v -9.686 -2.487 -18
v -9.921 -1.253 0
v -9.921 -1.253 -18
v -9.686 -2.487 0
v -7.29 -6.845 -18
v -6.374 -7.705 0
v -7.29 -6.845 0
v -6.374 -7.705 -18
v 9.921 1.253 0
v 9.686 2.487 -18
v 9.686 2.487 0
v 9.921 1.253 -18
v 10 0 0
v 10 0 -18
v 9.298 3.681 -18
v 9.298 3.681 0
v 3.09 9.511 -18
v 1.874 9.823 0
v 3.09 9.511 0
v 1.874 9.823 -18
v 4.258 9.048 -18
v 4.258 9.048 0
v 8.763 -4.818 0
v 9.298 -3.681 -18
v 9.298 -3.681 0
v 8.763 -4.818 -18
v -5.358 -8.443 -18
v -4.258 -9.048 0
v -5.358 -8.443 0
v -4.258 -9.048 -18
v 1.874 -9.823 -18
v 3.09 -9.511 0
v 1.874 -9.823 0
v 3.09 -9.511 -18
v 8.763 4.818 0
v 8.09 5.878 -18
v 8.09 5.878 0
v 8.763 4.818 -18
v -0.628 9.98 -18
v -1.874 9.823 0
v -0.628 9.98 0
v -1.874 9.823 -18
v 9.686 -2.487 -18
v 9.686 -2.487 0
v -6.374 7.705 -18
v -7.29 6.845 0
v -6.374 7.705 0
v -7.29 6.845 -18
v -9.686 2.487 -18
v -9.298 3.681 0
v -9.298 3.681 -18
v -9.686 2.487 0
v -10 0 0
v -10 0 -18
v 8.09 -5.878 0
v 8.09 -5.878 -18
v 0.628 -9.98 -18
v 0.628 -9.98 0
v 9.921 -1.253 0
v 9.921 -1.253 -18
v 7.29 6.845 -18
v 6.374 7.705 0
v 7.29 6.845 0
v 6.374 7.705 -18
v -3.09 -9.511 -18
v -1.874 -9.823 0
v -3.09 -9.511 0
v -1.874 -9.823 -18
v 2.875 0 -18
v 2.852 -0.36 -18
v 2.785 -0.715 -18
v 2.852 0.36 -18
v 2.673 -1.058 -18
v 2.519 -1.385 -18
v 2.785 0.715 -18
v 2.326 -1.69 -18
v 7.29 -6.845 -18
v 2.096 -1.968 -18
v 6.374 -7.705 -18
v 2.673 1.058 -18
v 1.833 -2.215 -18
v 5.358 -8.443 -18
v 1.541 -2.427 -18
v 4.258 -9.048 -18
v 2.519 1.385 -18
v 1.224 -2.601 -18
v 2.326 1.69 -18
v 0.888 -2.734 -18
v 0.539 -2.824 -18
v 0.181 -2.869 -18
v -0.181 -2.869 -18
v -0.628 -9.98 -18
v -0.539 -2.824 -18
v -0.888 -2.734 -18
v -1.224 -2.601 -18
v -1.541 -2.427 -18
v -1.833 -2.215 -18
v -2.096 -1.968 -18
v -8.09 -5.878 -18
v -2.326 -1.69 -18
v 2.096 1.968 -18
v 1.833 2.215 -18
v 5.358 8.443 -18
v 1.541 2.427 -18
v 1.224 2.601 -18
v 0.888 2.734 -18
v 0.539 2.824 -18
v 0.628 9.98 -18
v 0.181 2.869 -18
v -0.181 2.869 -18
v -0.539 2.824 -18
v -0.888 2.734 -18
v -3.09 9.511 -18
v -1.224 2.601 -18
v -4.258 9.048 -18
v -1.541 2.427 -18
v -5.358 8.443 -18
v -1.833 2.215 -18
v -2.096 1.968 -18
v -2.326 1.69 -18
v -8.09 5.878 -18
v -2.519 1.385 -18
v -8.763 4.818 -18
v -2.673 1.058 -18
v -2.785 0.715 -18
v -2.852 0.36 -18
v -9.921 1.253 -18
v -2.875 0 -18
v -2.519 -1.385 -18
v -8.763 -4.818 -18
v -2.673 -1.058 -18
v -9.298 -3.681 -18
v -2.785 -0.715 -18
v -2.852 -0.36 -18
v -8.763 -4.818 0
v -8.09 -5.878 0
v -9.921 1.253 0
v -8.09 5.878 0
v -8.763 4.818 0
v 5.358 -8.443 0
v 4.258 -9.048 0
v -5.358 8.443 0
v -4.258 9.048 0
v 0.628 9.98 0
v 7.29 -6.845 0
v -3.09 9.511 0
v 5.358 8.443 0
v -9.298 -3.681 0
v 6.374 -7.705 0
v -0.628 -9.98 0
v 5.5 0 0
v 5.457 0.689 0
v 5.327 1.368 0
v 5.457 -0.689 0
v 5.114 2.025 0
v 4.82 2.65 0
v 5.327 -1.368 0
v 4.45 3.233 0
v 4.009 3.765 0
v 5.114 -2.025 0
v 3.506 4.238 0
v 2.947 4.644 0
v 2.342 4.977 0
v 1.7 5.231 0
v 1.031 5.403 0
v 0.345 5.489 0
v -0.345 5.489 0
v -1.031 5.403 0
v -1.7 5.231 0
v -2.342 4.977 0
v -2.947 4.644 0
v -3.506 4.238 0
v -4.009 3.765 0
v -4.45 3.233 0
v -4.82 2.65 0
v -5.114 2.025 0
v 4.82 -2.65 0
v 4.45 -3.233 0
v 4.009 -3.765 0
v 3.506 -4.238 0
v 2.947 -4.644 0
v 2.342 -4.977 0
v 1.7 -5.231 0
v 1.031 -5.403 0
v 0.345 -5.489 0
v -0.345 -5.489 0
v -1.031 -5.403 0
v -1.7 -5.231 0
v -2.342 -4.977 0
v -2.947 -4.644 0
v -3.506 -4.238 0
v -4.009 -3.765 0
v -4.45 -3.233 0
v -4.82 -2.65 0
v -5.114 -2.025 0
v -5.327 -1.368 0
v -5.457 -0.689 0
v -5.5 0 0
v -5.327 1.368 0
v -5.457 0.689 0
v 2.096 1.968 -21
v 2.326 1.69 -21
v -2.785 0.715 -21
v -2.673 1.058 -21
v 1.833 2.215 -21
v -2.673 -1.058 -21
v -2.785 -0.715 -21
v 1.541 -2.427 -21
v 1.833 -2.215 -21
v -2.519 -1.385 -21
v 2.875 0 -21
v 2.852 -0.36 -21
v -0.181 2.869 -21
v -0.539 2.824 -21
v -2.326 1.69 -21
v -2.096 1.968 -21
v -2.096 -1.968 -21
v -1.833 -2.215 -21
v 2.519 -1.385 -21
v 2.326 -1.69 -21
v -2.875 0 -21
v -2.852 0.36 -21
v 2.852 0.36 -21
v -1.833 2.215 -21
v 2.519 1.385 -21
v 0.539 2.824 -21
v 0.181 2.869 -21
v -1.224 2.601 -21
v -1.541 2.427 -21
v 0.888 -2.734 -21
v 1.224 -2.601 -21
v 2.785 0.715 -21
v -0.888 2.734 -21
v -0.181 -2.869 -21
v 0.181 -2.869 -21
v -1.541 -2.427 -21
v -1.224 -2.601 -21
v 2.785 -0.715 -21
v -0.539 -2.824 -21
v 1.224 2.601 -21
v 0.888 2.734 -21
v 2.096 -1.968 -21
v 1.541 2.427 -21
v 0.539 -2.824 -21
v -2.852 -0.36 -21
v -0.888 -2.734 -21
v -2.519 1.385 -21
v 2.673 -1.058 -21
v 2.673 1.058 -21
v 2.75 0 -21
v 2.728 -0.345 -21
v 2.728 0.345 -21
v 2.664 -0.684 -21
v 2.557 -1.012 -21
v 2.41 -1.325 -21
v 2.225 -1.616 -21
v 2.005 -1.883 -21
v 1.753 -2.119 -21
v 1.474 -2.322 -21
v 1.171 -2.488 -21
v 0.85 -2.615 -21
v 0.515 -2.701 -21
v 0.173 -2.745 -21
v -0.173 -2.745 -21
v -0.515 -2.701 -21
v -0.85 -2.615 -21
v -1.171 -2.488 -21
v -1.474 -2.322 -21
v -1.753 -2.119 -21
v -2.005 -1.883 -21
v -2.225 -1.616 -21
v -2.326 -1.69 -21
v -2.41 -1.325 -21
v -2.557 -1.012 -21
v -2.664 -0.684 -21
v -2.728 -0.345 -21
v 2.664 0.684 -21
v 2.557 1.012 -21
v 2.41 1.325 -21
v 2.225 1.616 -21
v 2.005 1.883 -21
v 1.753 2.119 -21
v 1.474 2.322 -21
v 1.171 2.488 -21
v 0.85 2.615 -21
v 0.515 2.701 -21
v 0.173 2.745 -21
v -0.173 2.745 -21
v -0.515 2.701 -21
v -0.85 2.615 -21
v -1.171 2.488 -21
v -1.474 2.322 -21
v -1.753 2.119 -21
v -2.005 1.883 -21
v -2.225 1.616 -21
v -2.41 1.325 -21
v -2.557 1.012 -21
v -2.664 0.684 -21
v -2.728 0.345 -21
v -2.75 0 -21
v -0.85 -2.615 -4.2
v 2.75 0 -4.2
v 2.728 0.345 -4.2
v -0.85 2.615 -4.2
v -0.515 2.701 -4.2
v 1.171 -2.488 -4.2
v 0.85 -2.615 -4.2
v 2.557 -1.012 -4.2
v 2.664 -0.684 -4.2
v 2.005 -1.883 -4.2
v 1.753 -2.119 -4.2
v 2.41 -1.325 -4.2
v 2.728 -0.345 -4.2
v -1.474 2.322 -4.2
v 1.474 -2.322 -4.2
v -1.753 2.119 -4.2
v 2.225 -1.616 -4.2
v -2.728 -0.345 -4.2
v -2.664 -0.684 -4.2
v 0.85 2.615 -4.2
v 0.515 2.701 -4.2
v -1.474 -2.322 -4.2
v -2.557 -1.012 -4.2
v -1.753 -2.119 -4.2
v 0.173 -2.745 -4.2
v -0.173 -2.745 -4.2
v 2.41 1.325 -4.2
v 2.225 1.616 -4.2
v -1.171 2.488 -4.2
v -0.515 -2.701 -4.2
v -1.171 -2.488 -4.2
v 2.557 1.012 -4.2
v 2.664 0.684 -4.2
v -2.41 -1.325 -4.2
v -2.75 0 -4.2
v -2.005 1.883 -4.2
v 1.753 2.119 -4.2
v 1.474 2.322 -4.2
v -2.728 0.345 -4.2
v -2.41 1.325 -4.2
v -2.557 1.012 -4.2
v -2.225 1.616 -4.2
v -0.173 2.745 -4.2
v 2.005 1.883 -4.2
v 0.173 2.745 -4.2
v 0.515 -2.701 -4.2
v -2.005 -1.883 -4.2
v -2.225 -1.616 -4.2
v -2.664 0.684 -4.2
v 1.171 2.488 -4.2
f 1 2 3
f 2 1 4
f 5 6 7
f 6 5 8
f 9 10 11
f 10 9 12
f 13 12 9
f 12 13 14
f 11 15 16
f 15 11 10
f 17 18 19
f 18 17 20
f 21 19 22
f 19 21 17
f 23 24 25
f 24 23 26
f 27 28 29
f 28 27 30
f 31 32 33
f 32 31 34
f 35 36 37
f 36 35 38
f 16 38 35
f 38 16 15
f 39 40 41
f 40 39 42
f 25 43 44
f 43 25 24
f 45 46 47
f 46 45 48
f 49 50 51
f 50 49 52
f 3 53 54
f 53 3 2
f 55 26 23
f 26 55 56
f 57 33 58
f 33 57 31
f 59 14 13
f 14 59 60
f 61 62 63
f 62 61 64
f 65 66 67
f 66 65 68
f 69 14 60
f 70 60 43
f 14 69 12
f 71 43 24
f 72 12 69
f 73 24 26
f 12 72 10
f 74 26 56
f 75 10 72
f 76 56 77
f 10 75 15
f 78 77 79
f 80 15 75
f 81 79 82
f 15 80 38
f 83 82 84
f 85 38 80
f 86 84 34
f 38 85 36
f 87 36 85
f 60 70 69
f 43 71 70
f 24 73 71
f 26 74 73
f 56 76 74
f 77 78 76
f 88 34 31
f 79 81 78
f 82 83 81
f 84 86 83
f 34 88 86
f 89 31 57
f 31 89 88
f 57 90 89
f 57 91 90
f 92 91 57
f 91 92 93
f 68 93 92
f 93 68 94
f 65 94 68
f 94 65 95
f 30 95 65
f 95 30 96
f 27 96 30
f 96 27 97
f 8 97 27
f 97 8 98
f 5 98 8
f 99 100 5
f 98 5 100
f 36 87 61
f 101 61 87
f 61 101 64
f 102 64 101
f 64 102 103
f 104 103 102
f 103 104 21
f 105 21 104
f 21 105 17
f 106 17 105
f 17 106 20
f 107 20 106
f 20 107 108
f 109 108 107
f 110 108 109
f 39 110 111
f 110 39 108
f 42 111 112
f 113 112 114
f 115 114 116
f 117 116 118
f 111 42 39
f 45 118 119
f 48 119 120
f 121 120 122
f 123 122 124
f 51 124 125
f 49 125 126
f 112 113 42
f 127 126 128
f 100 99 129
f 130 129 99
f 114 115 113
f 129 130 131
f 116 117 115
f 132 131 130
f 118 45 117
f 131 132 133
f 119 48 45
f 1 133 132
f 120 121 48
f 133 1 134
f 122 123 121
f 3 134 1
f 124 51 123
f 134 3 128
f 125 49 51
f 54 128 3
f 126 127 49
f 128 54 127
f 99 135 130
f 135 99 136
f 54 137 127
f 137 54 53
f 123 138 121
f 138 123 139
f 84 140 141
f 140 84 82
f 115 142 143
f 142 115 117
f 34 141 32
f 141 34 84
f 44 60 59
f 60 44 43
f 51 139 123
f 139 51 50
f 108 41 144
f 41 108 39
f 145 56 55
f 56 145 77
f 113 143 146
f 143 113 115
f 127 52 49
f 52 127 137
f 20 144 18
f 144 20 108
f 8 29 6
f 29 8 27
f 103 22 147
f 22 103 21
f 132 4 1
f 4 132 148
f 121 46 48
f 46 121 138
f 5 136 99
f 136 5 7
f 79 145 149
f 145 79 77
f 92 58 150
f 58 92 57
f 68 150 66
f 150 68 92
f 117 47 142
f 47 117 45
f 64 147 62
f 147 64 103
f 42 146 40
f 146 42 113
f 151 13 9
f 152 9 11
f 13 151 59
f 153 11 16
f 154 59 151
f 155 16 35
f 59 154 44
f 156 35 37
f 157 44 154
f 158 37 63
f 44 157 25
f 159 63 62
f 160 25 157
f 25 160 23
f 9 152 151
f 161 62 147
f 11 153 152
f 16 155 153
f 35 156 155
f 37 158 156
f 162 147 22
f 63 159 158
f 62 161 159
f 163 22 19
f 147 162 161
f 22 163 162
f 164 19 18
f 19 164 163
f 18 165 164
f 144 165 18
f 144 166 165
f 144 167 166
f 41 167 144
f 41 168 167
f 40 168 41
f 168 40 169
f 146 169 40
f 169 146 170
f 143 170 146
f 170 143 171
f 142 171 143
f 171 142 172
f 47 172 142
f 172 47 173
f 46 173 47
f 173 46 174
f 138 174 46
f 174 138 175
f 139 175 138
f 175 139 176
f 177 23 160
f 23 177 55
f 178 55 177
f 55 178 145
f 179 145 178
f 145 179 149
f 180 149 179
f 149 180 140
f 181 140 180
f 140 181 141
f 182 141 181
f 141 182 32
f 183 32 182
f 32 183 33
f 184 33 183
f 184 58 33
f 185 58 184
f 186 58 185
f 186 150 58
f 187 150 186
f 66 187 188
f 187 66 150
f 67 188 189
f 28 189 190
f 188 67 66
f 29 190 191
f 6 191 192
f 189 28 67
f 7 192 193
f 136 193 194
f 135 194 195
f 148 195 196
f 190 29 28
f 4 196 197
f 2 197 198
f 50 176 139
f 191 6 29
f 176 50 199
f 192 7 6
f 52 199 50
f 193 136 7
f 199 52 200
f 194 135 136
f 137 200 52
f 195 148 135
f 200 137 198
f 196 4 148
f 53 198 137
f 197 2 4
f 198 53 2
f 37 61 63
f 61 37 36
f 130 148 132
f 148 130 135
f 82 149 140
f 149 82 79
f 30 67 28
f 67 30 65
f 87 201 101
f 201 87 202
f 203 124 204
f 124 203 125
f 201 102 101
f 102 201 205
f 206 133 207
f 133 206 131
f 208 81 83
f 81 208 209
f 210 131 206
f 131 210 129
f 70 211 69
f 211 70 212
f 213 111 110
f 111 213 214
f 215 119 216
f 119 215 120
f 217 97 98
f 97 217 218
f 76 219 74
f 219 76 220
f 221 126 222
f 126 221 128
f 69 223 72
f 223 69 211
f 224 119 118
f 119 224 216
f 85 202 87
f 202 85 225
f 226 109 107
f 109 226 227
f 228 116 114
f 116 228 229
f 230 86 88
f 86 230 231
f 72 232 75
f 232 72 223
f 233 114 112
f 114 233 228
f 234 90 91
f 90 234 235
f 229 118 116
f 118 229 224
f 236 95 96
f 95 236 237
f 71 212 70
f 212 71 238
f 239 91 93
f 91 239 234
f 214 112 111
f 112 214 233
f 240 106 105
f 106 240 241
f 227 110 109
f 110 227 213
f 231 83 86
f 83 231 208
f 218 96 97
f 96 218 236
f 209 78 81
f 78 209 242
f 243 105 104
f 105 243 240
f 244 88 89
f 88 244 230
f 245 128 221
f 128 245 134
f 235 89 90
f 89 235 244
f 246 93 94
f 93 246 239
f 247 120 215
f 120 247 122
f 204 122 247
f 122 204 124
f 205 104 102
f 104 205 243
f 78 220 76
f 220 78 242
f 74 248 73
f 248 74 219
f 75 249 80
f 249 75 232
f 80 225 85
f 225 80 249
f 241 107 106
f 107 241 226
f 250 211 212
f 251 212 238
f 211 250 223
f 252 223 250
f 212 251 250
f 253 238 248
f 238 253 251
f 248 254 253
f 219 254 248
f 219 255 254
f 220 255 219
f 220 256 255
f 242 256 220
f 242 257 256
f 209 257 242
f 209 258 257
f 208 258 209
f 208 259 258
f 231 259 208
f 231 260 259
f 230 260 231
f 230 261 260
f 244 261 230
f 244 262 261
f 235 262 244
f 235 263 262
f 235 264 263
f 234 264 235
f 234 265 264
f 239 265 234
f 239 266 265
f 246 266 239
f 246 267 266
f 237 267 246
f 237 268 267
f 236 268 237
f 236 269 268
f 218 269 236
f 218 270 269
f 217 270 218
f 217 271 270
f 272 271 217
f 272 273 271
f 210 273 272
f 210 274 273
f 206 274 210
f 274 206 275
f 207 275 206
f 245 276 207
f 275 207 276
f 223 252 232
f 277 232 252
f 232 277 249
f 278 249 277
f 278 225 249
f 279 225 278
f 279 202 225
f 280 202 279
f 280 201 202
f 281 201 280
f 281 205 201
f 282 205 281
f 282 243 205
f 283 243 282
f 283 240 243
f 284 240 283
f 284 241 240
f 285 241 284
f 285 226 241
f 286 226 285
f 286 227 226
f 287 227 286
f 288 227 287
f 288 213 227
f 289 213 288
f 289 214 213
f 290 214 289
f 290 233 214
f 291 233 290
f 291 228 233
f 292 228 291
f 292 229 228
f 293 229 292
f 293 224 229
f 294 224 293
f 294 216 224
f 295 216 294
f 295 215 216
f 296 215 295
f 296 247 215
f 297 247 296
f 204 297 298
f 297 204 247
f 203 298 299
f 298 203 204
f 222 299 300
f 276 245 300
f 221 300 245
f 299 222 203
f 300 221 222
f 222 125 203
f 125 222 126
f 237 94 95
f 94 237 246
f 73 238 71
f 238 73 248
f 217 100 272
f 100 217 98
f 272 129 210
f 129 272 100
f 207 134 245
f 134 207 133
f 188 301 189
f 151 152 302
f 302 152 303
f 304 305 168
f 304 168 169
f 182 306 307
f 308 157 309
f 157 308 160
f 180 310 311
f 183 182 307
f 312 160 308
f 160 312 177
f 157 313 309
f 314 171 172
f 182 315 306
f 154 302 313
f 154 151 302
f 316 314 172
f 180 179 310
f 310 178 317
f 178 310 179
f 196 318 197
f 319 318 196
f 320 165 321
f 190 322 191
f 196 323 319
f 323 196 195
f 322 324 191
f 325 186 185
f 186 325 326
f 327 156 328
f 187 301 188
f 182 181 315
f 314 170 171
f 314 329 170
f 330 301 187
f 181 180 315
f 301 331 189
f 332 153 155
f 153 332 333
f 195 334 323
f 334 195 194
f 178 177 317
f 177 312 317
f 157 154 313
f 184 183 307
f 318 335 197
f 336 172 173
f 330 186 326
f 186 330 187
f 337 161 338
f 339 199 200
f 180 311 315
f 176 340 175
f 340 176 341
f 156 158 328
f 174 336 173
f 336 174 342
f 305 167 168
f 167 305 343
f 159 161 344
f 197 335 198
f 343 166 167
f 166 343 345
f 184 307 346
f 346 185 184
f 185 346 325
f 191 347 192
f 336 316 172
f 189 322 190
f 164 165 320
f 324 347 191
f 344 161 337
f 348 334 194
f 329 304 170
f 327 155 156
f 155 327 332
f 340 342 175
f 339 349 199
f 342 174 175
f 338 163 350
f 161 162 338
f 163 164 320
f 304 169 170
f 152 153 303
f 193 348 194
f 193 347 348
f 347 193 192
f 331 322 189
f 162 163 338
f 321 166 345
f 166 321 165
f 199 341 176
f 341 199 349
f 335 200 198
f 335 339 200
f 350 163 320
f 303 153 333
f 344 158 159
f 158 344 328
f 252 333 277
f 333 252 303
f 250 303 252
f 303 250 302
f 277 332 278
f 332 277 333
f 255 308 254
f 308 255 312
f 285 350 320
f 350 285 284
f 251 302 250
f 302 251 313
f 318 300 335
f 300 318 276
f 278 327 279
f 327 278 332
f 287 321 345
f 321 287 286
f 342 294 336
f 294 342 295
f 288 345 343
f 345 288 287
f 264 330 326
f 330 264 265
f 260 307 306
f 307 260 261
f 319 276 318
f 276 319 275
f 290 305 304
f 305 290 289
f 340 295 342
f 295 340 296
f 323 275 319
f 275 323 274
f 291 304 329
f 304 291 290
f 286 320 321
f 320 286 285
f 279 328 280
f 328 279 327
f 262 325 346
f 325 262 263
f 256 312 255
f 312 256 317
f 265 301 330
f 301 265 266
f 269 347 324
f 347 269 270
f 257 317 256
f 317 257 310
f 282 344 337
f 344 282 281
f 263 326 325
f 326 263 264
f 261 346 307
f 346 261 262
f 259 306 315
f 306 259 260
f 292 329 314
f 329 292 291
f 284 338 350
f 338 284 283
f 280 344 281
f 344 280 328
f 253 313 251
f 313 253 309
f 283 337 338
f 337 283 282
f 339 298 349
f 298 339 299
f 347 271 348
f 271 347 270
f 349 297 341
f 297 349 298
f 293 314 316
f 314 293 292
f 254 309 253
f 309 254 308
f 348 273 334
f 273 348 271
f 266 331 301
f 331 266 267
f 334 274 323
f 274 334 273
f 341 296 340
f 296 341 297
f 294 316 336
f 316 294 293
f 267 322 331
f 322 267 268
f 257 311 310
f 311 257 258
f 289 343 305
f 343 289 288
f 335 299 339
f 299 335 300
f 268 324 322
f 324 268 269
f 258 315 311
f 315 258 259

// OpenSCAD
$fn = 50;

difference() {
	union() {
		translate(v = [0, 0, -18.0]) {
			cylinder(h = 18, r = 10.0);
		}
		#translate(v = [0, 0, -21.0]) {
			cylinder(h = 21, r = 2.875);
		}
	}
	union() {
		translate(v = [0, 0, 0]) {
			rotate(a = [0, 0, 0]) {
				difference() {
					union() {
						translate(v = [0, 0, -21.0]) {
							cylinder(h = 21, r = 2.25);
						}
						translate(v = [0, 0, -4.2]) {
							cylinder(h = 4.2, r1 = 2.75, r2 = 5.5);
						}
						translate(v = [0, 0, -21.0]) {
							cylinder(h = 21, r = 2.75);
						}
						translate(v = [0, 0, -21.0]) {
							cylinder(h = 21, r = 2.25);
						}
					}
					union();
				}
			}
		}
	}
}
